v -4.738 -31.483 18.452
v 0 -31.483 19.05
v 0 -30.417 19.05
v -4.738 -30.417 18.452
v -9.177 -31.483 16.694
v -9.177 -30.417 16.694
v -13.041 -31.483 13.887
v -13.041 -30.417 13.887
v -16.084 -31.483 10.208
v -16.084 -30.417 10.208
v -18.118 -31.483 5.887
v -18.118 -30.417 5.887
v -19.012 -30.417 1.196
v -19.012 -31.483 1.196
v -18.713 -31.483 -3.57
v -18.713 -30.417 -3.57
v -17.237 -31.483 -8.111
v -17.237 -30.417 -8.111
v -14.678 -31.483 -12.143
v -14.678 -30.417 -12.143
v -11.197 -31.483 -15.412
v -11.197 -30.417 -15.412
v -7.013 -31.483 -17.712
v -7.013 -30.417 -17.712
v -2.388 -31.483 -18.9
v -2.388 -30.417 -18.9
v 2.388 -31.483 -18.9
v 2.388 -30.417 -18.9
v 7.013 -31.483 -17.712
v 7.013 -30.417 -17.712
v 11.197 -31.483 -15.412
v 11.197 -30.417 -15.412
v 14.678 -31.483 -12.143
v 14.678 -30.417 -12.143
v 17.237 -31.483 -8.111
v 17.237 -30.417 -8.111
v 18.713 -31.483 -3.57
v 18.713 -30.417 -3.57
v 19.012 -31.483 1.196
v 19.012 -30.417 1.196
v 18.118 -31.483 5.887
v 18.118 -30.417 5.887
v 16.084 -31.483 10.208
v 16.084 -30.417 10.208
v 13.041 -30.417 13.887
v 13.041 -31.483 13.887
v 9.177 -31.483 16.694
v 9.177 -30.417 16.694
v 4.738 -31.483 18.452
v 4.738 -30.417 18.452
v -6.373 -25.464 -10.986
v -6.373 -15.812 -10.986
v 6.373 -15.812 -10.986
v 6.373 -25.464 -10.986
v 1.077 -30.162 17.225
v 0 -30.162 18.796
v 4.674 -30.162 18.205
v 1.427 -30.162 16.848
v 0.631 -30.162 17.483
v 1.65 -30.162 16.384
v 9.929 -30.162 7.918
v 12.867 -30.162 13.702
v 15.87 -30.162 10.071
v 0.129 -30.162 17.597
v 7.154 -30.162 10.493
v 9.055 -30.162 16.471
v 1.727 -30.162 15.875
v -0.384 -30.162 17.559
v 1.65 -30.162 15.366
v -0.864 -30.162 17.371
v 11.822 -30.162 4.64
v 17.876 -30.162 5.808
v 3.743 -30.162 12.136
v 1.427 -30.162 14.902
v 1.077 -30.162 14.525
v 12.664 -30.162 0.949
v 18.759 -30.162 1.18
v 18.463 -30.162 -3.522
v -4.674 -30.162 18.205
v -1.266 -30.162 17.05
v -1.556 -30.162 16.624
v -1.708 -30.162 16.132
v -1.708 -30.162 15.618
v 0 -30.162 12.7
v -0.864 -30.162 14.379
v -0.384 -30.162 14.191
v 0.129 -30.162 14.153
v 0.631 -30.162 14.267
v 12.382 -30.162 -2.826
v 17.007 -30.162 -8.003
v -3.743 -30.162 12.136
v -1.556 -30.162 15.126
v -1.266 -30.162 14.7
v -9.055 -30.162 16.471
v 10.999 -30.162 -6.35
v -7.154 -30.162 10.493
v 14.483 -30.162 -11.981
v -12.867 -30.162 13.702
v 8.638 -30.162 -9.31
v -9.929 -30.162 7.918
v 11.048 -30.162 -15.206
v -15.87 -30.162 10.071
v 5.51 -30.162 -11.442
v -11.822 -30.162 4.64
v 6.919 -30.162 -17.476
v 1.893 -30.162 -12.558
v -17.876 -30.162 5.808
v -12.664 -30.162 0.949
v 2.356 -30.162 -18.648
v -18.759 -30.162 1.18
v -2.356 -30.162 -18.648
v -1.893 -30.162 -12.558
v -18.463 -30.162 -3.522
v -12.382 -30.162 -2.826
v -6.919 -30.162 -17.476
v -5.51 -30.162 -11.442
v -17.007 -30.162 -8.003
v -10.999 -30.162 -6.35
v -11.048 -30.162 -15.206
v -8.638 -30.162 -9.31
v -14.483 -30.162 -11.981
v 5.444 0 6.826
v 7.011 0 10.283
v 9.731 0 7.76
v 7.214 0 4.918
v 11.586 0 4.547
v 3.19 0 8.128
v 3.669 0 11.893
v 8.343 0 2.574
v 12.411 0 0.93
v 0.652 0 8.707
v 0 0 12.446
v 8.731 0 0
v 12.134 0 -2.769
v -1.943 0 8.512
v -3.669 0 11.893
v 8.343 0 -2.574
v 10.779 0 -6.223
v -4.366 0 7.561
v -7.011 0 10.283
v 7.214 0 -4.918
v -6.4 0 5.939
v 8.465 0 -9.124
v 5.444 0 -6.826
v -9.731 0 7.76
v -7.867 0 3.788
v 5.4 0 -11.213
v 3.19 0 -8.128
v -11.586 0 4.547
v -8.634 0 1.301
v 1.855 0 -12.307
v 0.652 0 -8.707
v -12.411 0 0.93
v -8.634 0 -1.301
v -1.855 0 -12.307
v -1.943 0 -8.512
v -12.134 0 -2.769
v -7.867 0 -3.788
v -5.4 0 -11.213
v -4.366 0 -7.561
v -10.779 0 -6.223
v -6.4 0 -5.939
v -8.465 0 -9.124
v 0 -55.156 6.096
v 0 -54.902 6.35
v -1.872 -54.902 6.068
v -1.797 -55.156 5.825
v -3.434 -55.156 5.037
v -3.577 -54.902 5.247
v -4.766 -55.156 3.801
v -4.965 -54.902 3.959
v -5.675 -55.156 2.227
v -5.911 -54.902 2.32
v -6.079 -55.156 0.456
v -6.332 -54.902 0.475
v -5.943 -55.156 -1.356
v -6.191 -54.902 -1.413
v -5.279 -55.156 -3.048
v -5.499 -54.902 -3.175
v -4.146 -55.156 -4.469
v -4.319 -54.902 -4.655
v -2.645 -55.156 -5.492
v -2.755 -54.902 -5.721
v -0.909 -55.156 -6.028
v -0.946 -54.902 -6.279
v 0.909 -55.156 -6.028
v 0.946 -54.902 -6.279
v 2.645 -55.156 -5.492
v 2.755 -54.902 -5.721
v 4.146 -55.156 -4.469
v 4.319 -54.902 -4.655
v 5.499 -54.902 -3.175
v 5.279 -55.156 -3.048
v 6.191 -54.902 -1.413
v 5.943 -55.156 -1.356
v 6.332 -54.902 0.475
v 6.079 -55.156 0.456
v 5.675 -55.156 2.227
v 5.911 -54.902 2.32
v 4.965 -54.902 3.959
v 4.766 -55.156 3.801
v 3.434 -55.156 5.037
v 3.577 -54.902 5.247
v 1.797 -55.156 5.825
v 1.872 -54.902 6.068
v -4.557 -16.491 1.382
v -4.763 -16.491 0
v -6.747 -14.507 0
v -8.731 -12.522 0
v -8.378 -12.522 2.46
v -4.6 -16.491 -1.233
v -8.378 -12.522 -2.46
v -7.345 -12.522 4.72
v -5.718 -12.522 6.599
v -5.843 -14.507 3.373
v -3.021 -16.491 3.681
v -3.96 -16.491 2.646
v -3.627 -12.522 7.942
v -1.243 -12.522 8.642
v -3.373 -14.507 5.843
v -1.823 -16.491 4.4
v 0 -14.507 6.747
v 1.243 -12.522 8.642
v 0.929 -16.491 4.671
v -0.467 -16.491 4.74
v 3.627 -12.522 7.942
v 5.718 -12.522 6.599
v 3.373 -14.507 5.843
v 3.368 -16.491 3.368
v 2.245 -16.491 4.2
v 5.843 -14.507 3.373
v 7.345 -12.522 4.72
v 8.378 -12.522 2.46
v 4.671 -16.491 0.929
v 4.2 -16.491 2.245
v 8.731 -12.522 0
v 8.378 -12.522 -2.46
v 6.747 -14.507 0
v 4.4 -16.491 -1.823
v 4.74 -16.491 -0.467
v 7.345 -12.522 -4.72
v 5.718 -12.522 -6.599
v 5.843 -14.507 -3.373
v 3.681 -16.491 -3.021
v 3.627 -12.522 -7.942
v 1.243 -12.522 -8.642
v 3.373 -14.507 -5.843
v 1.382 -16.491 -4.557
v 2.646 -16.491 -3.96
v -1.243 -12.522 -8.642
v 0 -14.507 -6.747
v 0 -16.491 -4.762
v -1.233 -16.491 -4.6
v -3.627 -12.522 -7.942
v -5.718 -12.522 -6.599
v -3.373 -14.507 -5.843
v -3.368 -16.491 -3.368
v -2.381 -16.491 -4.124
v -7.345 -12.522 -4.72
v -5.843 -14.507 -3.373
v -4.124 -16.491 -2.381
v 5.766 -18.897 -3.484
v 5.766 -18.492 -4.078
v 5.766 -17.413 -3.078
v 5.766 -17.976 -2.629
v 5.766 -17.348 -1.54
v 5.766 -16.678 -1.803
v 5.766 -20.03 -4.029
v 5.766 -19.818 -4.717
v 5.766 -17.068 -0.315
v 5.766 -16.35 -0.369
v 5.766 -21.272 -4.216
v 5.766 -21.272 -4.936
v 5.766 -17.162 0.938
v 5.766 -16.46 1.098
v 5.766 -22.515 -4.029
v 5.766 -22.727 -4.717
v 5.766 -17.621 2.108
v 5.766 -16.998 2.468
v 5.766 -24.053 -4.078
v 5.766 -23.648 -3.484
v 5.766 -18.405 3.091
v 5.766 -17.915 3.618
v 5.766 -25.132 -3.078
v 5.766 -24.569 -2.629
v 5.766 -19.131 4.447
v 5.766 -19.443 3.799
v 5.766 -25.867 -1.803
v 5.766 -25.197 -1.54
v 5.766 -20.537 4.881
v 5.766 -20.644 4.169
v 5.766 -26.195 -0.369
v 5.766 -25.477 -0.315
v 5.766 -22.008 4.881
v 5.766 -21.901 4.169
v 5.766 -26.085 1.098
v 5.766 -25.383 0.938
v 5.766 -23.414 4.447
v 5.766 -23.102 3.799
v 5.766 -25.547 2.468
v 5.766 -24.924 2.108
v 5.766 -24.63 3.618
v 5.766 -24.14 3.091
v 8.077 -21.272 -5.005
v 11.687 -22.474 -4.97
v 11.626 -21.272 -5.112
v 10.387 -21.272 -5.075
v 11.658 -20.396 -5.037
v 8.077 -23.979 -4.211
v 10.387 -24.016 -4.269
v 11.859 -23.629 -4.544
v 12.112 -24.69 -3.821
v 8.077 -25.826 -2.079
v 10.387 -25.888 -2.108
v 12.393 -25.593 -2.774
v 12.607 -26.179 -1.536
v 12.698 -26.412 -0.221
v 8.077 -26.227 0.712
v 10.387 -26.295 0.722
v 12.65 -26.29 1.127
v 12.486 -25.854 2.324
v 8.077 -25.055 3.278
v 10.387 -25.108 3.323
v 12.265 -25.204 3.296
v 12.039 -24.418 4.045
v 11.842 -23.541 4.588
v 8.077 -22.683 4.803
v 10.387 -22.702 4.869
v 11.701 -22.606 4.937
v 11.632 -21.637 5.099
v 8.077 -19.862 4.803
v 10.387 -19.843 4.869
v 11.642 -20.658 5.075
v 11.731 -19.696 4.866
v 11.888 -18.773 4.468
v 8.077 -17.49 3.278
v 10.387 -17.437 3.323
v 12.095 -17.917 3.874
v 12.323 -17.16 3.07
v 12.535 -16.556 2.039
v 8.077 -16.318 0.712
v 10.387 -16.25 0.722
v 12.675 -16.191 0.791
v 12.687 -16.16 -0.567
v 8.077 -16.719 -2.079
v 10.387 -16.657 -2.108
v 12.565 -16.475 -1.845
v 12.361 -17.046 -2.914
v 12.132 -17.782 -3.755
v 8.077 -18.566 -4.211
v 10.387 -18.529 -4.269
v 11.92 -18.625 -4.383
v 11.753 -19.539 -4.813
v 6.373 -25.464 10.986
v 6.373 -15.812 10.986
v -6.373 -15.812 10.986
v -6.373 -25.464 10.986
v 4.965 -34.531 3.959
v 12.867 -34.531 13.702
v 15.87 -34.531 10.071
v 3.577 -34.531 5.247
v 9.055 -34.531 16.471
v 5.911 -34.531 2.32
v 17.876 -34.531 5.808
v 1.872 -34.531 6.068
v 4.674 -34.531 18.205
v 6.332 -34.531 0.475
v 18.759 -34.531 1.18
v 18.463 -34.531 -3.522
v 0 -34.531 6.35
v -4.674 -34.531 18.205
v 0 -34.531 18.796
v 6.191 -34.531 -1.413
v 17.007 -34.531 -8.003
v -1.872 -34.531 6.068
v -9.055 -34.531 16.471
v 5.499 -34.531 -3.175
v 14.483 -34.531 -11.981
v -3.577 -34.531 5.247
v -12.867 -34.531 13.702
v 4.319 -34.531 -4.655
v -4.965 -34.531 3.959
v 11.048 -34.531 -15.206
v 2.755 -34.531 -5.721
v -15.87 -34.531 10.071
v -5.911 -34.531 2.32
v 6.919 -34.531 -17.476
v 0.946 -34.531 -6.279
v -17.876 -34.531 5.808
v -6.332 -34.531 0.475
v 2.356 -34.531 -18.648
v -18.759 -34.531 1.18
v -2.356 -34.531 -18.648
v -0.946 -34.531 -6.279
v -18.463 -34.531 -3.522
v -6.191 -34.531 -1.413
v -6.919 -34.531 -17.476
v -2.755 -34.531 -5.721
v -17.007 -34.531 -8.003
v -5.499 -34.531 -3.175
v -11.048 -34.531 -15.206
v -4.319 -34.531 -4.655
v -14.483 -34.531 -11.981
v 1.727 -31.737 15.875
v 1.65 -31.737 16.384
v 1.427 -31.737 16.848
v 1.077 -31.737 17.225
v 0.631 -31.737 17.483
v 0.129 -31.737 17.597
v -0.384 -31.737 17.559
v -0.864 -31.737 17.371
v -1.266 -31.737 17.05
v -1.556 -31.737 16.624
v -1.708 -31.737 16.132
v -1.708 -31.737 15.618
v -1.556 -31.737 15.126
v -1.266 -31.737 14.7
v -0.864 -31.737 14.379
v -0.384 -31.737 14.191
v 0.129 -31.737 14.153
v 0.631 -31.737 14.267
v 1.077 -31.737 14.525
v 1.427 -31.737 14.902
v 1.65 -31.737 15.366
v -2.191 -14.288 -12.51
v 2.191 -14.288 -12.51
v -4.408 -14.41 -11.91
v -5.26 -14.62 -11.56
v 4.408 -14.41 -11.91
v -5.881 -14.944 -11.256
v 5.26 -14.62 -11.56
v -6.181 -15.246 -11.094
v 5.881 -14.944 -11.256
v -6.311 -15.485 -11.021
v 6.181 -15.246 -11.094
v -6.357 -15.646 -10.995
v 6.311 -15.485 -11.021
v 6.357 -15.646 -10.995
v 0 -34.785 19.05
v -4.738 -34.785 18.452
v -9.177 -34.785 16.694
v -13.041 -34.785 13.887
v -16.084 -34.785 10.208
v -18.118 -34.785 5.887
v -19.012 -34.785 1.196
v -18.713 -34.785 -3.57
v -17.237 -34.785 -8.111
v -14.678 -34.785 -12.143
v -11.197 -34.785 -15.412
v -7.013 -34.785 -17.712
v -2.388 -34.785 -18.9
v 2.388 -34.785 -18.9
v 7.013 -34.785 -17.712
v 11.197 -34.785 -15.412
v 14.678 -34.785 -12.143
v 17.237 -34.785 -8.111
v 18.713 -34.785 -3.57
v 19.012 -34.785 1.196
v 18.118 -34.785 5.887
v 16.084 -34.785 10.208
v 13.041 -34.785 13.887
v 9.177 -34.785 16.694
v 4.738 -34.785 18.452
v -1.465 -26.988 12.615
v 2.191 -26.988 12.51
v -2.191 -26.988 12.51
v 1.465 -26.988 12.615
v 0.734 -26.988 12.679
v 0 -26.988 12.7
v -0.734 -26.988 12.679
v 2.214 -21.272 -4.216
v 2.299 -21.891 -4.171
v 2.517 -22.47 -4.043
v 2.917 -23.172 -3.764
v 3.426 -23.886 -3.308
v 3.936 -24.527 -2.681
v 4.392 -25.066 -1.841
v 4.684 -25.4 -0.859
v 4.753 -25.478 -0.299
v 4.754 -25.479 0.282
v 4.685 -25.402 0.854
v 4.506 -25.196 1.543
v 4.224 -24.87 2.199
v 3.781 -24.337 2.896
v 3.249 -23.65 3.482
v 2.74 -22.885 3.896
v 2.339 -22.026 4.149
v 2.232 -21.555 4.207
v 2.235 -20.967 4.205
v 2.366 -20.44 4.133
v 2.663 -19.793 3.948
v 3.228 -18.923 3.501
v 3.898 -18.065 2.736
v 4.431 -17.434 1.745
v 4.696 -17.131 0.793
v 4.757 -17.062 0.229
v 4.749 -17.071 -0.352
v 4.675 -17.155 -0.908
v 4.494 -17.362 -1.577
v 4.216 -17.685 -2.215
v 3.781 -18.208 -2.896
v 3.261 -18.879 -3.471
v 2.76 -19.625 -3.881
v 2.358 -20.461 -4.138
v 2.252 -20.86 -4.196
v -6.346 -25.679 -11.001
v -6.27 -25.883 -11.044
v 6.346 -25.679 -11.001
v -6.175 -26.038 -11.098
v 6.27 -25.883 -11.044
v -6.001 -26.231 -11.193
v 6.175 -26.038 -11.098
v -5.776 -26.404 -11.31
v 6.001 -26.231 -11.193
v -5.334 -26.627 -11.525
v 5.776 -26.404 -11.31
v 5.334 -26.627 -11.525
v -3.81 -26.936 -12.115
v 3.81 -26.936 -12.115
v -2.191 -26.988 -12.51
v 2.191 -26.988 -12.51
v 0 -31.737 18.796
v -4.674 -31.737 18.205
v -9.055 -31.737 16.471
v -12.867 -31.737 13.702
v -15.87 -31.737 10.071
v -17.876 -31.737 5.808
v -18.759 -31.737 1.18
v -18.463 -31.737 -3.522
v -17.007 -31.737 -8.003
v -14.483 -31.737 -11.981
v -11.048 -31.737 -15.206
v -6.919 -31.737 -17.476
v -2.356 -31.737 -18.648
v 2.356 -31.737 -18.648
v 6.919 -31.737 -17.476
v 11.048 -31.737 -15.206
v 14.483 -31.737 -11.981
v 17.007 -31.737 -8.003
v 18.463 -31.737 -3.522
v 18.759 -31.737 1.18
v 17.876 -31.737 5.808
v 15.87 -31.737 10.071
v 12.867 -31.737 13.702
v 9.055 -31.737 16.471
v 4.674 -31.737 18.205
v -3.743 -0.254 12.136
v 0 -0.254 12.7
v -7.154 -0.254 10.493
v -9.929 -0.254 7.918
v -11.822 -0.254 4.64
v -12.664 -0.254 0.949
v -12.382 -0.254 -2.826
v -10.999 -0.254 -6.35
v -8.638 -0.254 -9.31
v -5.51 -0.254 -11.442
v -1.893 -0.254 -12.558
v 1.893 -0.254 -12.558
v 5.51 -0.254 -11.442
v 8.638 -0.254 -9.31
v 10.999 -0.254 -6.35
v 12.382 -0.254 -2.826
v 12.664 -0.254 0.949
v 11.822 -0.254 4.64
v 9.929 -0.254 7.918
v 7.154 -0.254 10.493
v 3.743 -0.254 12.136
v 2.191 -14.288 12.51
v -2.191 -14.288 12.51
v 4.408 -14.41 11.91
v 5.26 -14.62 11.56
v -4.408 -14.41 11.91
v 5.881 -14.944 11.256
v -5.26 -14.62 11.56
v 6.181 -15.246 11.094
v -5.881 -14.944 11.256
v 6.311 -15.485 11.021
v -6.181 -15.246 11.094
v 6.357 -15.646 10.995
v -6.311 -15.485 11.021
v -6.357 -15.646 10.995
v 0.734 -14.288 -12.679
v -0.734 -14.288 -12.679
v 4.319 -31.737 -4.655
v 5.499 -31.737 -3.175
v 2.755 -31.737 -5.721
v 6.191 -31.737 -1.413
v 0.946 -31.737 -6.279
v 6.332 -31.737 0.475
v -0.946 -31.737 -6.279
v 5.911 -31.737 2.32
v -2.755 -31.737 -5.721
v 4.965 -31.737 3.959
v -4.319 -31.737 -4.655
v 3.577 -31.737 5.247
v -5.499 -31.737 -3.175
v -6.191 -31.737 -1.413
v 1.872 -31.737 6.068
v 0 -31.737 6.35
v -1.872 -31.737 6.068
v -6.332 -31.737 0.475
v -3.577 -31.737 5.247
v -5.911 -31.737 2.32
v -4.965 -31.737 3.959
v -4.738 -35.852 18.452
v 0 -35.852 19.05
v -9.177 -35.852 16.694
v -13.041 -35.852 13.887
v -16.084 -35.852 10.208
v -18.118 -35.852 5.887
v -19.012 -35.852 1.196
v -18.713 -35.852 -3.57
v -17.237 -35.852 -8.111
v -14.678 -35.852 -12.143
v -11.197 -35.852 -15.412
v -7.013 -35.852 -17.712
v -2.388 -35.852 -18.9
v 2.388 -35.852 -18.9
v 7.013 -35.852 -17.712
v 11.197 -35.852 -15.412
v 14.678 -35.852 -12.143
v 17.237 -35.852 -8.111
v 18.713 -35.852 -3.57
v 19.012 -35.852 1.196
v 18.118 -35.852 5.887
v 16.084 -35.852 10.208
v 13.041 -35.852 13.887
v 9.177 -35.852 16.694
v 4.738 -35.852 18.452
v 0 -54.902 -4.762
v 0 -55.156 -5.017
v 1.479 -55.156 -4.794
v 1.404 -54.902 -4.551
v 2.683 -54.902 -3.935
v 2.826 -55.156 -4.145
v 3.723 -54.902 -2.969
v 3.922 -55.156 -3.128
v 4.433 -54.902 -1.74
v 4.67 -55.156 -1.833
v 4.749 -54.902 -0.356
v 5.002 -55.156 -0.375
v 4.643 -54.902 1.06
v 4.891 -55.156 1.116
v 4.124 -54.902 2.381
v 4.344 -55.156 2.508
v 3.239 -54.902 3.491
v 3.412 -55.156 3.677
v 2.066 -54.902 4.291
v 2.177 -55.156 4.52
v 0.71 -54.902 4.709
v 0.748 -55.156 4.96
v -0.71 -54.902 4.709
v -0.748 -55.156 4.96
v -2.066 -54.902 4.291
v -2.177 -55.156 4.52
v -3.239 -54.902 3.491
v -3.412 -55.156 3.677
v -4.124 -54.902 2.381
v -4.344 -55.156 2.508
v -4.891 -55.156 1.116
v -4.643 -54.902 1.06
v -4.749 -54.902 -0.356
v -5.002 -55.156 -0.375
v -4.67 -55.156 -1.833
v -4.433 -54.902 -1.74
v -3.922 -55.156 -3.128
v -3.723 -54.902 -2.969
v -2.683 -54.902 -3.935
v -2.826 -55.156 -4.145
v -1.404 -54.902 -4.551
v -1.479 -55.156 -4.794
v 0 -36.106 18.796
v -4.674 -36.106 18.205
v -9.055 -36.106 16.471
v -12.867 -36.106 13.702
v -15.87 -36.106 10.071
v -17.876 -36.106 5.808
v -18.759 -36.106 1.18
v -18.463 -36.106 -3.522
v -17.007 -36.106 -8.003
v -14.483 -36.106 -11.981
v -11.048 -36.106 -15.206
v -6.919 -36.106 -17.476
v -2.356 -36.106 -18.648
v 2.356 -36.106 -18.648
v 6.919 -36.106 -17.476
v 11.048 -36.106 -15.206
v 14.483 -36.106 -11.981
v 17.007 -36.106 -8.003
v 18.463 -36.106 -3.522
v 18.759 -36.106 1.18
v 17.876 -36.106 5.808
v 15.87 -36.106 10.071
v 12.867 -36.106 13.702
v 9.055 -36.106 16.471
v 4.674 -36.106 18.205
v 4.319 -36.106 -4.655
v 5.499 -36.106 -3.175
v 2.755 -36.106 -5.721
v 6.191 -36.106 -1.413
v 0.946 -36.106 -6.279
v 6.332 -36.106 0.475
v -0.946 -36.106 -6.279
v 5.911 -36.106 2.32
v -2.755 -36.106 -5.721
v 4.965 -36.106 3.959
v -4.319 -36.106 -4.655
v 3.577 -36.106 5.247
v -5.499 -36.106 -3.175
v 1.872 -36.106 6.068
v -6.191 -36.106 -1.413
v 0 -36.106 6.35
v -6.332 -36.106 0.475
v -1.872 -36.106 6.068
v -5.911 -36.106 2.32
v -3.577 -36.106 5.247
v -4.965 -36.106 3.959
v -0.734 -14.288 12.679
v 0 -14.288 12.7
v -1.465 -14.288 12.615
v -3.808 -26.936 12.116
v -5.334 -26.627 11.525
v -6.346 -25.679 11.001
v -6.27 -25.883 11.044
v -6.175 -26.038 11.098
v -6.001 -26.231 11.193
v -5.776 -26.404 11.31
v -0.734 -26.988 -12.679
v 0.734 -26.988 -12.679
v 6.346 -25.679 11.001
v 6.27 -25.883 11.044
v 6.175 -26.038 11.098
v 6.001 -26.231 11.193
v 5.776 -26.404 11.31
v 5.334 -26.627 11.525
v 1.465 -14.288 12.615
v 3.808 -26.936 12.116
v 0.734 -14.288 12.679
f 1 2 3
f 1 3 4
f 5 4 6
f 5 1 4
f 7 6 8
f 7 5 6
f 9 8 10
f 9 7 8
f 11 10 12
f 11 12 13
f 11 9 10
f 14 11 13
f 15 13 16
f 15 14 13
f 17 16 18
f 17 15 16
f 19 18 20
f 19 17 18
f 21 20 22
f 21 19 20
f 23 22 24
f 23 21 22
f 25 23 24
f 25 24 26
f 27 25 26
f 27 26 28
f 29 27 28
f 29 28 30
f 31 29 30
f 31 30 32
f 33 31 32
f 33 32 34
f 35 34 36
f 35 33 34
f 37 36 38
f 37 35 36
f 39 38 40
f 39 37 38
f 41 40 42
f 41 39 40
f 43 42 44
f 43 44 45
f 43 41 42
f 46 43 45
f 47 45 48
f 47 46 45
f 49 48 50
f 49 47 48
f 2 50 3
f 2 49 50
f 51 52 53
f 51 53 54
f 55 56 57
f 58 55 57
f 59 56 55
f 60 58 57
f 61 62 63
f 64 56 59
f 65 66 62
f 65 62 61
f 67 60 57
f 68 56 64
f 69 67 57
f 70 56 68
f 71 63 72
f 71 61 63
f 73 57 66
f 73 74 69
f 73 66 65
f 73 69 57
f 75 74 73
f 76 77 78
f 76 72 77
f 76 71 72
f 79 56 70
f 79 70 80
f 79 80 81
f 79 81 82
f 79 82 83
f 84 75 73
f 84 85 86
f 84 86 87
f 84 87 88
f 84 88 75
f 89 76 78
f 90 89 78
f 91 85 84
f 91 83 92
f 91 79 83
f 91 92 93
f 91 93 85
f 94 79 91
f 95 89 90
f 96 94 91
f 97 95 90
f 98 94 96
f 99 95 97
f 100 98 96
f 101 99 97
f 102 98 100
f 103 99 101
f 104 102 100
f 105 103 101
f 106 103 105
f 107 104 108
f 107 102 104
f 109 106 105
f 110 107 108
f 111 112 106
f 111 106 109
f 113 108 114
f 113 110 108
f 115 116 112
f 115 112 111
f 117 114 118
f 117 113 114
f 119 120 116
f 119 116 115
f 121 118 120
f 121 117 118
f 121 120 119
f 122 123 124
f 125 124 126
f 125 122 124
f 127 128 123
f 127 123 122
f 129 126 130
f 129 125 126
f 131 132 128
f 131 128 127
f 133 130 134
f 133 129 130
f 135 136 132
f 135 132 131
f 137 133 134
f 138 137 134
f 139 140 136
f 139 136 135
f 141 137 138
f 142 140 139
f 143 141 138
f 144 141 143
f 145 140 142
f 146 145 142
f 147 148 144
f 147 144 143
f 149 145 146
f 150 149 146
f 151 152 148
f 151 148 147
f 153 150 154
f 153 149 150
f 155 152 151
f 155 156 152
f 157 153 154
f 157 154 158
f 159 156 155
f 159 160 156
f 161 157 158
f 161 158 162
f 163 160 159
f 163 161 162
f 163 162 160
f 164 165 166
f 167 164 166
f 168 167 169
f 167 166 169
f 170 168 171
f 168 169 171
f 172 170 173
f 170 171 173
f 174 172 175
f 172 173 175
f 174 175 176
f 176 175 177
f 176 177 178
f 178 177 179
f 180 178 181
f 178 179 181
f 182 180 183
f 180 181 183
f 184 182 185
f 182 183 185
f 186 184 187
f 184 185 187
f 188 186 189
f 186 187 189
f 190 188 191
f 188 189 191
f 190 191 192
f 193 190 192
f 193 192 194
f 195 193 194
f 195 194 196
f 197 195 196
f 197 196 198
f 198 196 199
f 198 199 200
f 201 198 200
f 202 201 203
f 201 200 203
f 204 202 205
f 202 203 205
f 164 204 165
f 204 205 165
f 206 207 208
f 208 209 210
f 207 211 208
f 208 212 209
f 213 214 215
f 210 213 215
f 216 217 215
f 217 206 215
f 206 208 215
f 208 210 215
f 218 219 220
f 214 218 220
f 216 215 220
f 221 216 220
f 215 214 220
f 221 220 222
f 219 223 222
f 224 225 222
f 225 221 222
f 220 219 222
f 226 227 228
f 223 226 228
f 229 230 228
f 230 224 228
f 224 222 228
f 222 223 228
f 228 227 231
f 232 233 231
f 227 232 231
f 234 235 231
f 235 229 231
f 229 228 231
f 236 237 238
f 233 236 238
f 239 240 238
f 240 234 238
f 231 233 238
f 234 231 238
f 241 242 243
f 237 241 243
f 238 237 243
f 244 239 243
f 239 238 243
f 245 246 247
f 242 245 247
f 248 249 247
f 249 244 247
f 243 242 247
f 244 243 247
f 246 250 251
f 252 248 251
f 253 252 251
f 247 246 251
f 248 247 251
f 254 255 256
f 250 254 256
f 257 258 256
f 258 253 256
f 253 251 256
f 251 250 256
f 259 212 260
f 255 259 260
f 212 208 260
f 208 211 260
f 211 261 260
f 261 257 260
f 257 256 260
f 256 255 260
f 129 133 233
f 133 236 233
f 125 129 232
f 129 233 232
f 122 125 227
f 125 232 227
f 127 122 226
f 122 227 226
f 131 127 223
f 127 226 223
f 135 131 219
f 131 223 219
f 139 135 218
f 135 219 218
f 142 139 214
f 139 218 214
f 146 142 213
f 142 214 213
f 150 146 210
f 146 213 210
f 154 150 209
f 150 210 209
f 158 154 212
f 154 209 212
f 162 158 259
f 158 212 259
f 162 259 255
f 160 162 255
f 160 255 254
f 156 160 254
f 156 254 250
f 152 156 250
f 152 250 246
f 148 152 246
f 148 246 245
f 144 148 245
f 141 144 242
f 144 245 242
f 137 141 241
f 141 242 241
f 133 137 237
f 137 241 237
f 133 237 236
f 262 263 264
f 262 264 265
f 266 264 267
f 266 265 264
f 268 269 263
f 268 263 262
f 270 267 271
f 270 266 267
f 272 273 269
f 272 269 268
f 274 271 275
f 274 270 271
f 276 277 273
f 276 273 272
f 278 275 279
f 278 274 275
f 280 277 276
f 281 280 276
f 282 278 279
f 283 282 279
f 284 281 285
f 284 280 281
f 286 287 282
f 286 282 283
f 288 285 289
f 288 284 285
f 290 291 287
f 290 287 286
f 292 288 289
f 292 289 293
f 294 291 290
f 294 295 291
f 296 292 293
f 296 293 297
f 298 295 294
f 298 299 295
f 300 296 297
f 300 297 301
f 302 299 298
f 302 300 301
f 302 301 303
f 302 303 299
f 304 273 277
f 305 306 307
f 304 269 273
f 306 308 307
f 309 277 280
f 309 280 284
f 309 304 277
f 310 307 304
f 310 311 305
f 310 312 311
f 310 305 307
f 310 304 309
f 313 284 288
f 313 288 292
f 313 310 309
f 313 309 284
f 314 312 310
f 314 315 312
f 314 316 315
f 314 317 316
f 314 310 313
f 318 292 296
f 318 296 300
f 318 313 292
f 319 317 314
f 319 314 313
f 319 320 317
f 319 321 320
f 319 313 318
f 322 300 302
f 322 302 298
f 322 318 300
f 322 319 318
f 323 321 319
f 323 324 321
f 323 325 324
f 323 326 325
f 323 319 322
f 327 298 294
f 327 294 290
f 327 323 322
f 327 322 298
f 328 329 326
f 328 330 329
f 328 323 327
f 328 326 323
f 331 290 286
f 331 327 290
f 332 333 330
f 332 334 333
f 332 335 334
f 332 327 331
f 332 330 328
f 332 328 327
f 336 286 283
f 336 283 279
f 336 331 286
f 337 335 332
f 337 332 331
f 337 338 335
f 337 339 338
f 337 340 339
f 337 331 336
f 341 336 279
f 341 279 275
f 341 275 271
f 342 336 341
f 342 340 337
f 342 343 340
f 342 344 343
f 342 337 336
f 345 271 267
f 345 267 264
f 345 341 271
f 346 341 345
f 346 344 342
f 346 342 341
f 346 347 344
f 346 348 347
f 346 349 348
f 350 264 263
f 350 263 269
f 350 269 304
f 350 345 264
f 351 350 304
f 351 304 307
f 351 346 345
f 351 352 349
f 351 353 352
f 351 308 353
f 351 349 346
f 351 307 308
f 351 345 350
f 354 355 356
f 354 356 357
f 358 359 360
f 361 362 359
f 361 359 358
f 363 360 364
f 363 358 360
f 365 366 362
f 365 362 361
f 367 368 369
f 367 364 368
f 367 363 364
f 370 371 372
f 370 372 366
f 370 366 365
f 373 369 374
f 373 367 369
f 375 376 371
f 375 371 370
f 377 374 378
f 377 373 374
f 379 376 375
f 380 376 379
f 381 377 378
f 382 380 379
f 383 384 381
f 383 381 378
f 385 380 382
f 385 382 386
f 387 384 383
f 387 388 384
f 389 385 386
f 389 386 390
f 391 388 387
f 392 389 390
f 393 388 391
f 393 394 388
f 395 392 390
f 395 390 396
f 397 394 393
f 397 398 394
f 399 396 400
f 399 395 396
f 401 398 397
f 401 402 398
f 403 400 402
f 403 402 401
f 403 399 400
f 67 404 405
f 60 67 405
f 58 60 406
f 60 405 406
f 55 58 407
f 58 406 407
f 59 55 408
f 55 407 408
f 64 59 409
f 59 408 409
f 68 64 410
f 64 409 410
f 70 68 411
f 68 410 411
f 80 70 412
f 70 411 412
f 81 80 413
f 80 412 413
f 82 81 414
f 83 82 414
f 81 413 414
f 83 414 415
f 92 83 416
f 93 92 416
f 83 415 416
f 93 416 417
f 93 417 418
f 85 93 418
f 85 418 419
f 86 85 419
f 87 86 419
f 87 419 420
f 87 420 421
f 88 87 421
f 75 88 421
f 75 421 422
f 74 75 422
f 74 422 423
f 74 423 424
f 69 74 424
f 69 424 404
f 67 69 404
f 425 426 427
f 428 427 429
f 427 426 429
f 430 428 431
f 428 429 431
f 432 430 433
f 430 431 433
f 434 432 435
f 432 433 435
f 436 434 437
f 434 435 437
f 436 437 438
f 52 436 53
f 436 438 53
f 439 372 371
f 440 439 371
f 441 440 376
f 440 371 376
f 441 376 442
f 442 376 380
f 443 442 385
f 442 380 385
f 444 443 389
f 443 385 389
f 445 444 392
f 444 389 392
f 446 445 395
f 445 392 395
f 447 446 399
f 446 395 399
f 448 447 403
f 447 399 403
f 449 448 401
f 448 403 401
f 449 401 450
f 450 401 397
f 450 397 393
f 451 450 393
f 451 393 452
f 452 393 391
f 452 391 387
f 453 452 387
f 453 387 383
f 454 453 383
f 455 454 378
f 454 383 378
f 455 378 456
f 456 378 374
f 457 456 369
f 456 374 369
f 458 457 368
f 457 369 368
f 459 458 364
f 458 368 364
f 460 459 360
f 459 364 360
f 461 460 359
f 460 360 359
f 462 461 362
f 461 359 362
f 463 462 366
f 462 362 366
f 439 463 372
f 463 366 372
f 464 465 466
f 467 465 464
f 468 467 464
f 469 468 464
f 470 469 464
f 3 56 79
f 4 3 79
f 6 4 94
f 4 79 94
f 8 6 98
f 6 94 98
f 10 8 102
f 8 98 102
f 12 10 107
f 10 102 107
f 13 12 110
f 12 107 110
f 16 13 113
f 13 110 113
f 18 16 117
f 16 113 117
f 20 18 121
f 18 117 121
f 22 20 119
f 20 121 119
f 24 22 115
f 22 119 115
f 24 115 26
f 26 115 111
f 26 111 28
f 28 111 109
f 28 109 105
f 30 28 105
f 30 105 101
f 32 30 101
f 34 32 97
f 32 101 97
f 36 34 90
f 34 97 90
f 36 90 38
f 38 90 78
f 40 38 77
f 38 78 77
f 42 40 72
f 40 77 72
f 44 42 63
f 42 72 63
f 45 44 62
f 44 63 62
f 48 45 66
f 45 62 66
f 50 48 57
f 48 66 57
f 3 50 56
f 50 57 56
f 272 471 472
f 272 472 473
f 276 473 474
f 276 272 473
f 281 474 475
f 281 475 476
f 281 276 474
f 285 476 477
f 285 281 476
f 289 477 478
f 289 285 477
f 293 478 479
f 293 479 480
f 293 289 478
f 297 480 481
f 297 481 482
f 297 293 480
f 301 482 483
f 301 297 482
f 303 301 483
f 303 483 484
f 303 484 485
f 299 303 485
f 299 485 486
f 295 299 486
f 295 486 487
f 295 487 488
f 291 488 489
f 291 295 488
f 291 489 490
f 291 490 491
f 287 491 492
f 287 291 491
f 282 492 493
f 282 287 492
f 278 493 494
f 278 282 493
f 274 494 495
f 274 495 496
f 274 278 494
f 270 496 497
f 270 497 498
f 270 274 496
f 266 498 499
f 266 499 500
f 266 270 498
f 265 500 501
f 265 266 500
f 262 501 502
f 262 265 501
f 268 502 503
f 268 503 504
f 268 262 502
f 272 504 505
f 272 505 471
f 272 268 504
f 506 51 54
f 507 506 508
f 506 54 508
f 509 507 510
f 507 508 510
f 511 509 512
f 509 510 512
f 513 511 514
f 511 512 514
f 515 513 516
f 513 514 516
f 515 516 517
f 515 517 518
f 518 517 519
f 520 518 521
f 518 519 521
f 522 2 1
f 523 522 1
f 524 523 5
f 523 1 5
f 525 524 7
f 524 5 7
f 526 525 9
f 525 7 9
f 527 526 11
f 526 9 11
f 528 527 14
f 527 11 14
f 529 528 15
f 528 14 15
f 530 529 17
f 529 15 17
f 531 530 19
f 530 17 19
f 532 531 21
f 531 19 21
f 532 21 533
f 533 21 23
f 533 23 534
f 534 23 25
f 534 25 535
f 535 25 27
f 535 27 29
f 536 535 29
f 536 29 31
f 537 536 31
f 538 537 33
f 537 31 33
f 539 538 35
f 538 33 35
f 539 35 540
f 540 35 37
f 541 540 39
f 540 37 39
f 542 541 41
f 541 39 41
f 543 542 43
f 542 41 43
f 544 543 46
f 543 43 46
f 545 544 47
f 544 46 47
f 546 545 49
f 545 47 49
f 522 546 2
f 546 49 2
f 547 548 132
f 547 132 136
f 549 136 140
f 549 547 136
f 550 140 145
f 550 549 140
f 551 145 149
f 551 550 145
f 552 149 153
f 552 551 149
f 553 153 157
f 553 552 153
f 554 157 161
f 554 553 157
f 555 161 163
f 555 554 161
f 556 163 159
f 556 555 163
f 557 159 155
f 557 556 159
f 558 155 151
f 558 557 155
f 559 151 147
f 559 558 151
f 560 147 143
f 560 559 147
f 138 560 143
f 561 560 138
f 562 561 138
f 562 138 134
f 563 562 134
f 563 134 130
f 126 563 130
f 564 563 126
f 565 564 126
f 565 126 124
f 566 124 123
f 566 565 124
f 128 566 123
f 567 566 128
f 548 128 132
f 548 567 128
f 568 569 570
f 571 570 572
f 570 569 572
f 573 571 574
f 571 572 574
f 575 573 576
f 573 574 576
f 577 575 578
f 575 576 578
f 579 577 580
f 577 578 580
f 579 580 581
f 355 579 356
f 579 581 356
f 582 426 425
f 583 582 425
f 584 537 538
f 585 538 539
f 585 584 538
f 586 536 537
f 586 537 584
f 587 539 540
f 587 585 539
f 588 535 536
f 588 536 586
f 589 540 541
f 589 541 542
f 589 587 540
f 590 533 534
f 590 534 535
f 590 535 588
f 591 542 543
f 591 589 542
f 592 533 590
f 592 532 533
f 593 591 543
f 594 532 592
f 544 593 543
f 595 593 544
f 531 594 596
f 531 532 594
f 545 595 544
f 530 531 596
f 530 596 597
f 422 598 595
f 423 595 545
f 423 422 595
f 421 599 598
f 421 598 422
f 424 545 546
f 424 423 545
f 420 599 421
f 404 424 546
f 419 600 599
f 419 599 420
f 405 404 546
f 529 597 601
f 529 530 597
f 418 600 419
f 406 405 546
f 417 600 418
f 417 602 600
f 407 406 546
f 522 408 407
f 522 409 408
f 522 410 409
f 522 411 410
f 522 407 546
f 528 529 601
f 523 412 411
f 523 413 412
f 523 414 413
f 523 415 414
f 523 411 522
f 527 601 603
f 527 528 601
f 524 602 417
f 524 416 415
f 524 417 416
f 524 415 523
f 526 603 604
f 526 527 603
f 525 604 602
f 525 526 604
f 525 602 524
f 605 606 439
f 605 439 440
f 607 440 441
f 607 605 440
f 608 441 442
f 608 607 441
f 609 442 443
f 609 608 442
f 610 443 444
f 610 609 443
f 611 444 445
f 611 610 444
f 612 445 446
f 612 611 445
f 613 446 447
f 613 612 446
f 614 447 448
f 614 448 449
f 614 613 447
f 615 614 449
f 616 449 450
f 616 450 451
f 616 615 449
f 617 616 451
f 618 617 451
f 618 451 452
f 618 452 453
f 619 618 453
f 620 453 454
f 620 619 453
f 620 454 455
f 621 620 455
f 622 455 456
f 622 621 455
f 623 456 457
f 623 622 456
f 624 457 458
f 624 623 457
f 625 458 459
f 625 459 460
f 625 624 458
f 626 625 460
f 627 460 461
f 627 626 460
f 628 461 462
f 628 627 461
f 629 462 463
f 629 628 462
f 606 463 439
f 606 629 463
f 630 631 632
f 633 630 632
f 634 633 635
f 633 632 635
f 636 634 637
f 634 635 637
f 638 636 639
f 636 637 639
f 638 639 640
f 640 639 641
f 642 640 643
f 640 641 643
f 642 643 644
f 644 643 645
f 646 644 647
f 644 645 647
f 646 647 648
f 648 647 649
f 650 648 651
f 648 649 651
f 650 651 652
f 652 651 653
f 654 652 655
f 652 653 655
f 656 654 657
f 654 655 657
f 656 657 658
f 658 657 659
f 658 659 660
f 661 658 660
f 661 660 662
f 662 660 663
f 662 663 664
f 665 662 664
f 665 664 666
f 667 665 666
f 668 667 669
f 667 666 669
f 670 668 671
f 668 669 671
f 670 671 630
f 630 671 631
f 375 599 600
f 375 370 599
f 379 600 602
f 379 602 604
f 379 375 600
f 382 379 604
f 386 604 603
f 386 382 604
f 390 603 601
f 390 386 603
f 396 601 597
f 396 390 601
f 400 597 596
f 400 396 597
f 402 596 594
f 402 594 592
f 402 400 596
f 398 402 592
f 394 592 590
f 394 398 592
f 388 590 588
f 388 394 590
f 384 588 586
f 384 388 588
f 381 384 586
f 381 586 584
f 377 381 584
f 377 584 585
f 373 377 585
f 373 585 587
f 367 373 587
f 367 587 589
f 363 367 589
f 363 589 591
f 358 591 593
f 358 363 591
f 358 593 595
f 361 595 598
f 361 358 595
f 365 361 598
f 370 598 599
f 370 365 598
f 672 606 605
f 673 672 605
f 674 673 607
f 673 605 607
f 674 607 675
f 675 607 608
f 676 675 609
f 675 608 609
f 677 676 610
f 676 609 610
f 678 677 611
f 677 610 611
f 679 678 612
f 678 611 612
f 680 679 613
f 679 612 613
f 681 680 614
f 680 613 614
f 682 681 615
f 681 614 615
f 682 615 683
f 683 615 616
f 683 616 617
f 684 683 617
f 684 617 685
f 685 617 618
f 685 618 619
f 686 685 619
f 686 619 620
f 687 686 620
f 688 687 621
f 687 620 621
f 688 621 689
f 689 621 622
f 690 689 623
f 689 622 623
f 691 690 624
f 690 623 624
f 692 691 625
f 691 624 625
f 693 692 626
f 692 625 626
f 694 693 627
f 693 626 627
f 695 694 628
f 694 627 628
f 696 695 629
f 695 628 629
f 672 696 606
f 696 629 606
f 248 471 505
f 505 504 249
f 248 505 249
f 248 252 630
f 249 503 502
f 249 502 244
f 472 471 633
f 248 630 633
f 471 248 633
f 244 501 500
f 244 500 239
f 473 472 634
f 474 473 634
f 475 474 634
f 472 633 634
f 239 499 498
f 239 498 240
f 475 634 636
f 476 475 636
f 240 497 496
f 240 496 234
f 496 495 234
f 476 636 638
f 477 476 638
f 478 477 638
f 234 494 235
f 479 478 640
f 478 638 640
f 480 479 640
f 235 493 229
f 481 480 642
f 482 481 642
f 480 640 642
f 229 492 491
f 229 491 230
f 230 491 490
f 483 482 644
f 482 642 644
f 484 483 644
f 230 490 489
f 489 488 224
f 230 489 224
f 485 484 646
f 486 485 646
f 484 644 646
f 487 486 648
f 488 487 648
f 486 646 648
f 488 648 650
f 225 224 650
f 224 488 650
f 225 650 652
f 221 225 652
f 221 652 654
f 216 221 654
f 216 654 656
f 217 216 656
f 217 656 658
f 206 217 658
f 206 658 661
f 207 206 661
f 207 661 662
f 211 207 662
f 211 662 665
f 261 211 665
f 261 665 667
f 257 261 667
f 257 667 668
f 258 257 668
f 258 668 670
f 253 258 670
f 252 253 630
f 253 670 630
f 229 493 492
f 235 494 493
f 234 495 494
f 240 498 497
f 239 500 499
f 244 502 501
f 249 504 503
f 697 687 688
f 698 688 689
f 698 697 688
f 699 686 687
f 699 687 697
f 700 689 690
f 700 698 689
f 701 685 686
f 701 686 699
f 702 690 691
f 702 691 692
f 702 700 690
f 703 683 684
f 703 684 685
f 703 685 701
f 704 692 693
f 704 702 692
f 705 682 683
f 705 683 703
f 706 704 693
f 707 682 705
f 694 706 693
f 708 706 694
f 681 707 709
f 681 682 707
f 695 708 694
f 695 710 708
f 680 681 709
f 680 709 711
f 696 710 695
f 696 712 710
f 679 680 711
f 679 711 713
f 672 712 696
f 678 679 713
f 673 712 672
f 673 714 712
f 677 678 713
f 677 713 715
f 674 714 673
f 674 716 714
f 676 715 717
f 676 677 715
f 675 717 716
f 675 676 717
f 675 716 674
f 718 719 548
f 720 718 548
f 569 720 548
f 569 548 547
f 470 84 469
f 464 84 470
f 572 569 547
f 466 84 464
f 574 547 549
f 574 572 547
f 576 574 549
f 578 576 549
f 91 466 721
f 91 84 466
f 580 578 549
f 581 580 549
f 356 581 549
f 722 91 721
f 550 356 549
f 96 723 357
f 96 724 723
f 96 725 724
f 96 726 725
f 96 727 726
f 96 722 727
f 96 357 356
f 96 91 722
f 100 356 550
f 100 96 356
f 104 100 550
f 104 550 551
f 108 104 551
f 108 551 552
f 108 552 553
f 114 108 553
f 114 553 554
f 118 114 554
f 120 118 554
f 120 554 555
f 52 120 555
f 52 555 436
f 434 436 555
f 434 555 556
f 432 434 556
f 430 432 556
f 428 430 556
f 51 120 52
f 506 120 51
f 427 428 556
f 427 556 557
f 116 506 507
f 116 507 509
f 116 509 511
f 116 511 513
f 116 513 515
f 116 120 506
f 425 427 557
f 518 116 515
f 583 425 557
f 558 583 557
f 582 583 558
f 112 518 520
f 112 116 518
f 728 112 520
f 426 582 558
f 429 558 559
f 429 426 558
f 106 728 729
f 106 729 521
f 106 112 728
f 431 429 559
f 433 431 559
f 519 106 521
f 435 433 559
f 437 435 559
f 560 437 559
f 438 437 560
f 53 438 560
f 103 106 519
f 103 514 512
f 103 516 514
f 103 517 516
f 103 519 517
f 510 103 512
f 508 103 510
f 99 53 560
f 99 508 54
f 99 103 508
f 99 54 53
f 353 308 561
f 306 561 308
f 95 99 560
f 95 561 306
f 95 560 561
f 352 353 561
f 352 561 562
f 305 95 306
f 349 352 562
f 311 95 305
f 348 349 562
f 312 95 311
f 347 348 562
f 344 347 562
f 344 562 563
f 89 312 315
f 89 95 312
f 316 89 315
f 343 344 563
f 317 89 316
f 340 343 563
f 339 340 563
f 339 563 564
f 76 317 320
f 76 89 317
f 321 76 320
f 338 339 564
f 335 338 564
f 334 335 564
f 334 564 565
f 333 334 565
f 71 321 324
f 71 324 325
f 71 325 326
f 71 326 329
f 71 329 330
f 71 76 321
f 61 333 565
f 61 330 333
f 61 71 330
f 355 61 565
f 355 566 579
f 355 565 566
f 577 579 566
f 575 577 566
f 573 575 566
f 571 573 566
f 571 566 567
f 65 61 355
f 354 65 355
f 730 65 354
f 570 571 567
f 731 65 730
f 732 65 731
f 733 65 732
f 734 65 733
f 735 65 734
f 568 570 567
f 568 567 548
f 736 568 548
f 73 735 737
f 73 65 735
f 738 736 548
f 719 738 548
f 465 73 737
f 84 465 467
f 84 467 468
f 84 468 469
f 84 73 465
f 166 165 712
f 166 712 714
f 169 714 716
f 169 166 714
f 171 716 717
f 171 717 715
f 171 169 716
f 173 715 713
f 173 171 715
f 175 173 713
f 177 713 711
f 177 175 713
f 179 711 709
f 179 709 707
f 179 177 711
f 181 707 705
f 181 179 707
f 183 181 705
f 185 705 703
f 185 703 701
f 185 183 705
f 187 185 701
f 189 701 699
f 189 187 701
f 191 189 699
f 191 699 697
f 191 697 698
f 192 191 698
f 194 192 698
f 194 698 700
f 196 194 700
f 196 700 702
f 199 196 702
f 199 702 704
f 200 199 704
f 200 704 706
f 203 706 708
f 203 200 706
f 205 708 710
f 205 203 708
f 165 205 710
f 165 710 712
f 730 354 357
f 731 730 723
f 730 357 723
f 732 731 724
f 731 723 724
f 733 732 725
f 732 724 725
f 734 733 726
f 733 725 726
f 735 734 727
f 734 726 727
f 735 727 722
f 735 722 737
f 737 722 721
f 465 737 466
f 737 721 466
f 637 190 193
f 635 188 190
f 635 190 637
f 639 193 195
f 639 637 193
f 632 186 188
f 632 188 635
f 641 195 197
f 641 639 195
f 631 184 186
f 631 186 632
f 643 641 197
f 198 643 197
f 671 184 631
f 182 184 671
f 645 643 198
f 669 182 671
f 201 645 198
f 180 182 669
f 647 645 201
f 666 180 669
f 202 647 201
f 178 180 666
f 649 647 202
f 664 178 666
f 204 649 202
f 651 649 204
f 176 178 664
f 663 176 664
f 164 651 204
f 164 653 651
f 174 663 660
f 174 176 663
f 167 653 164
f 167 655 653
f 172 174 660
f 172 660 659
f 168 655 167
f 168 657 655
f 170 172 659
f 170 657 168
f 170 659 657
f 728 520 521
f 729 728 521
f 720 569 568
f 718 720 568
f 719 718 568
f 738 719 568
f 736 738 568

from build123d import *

# Parameters (mm, degrees)
F_3_4_16_TAPPED_HOLE1_D     = 17.4625
F_3_4_16_TAPPED_HOLE1_DEPTH = 12.5222
F_3_4_16_TAPPED_HOLE1_TIP   = 8.73125
SKETCH9_R                   = 4.7625
THRU_HOLE_DEPTH             = 62.384040094
WRENCH_FLATS_7_8_DEPTH      = 12.7
BREAK_ALL_EDGES_SIZE        = 0.254
F_8_32_TAPPED_HOLE1_D       = 3.4544
F_8_32_TAPPED_HOLE1_DEPTH   = 4.3688


with BuildPart() as part:
    # Sketch1 → Revolve1 (revolve)
    with BuildSketch(Plane(origin=(0, 0, 0), x_dir=(0, 0, -1), z_dir=(1, 0, 0))):
        Polygon((0, 0), (-12.7, 0), (-12.7, -30.1625), (-19.05, -30.1625), (-19.05, -31.7373), (-6.35, -31.7373), (-6.35, -34.5313), (-19.05, -34.5313), (-19.05, -36.1061), (-6.35, -36.1061), (-6.35, -55.1561), (0, -55.1561), align=None)
    revolve(axis=Axis((0, 0, 0), (0, -1, 0)))

    # Sketch5 → 1/8 NPT Tapped Hole1 (revolve, cut)
    with BuildSketch(Plane(origin=(12.7, -21.2725, 0), x_dir=(0, 0, -1), z_dir=(0, 1, 0))):
        Polygon((0, 0), (0, 14.166668714), (4.2164, 11.6332), (4.2164, 6.9342), (4.936185566, 6.9342), (5.1438048, 0), align=None)
    revolve(axis=Axis((19.05, -21.2725, 0), (-1, 0, 0)), mode=Mode.SUBTRACT)

    # 3/4-16 Tapped Hole1
    with Locations(Plane(origin=(0, 0, 0), x_dir=(-1, 0, 0), z_dir=(0, 1, 0))):
        with Locations((0, 0)):
            Hole(F_3_4_16_TAPPED_HOLE1_D / 2, depth=F_3_4_16_TAPPED_HOLE1_DEPTH)
            with Locations((0, 0, -(F_3_4_16_TAPPED_HOLE1_DEPTH + F_3_4_16_TAPPED_HOLE1_TIP / 2))):  # 90° drill point
                Cone(0, F_3_4_16_TAPPED_HOLE1_D / 2, F_3_4_16_TAPPED_HOLE1_TIP, mode=Mode.SUBTRACT)

    # Sketch9 → Thru hole (cut, through all)
    with BuildSketch(Plane.XZ.offset(55.1561)):
        with Locations(Location((0, 0, 0), (0, 0, 270))):
            Circle(SKETCH9_R)
    extrude(amount=-THRU_HOLE_DEPTH, mode=Mode.SUBTRACT)

    # Sketch10 → Wrench flats 7/8" (cut, symmetric)
    with BuildSketch(Plane(origin=(0, 0, 0), x_dir=(0, 0, -1), z_dir=(1, 0, 0))):
        with BuildLine():
            Line((-12.7, -14.2875), (-12.5095, -14.2875))
            ThreePointArc((-12.5095, -14.2875), (-11.431869265, -14.733869265), (-10.9855, -15.8115))
            Line((-10.9855, -15.8115), (-10.9855, -25.4635))
            ThreePointArc((-10.9855, -25.4635), (-11.431869265, -26.541130735), (-12.5095, -26.9875))
            Line((-12.5095, -26.9875), (-12.7, -26.9875))
            Line((-12.7, -26.9875), (-12.7, -14.2875))
        make_face()
        with BuildLine():
            Line((10.9855, -15.8115), (10.9855, -25.4635))
            ThreePointArc((10.9855, -25.4635), (11.431869265, -26.541130735), (12.5095, -26.9875))
            Line((12.5095, -26.9875), (12.7, -26.9875))
            Line((12.7, -26.9875), (12.7, -14.2875))
            Line((12.7, -14.2875), (12.5095, -14.2875))
            ThreePointArc((12.5095, -14.2875), (11.431869265, -14.733869265), (10.9855, -15.8115))
        make_face()
    extrude(amount=WRENCH_FLATS_7_8_DEPTH, both=True, mode=Mode.SUBTRACT)

    # Break all edges
    break_all_edges_edges = [part.edges().sort_by_distance(p)[0] for p in [
        (0, -34.5313, -19.05),
        (0, -36.1061, -19.05),
        (0, -55.1561, -6.35),
        (0, -55.1561, 4.7625),
        (0, 0, -12.7),
        (0, -30.1625, -19.05),
        (0, -31.7373, -19.05),
    ]]
    chamfer(break_all_edges_edges, length=BREAK_ALL_EDGES_SIZE)

    # #8-32 Tapped Hole1
    with Locations(Plane(origin=(0, -30.1625, 0), x_dir=(-1, 0, 0), z_dir=(0, 1, 0))):
        with Locations((0, 15.875)):
            Hole(F_8_32_TAPPED_HOLE1_D / 2, depth=F_8_32_TAPPED_HOLE1_DEPTH)


solid = part.part
